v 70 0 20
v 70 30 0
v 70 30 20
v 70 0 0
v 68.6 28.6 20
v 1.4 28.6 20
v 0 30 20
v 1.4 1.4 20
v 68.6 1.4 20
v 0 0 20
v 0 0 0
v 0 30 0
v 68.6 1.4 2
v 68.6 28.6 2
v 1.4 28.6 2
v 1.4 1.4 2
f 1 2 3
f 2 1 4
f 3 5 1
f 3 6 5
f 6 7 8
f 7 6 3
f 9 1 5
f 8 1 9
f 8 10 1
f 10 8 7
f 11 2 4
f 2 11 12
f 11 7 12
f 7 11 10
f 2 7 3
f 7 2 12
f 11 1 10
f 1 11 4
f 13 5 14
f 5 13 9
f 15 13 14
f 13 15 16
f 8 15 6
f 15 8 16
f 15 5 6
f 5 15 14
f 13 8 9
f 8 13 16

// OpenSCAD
$fn = 32;

// ----------------------------------------------------------------------
// Open box: 1.4 mm walls
// ----------------------------------------------------------------------

// --- parameters (mm) ---
box_l = 70;               // outer length, X
box_w = 30;               // outer width, Y
box_h = 20;               // outer height, Z
wall = 1.4;               // wall thickness
floor = 2;                // floor thickness

difference() {
  cube([box_l, box_w, box_h]);
  translate([wall, wall, floor])
    cube([box_l - 2 * wall, box_w - 2 * wall, box_h]);
}
